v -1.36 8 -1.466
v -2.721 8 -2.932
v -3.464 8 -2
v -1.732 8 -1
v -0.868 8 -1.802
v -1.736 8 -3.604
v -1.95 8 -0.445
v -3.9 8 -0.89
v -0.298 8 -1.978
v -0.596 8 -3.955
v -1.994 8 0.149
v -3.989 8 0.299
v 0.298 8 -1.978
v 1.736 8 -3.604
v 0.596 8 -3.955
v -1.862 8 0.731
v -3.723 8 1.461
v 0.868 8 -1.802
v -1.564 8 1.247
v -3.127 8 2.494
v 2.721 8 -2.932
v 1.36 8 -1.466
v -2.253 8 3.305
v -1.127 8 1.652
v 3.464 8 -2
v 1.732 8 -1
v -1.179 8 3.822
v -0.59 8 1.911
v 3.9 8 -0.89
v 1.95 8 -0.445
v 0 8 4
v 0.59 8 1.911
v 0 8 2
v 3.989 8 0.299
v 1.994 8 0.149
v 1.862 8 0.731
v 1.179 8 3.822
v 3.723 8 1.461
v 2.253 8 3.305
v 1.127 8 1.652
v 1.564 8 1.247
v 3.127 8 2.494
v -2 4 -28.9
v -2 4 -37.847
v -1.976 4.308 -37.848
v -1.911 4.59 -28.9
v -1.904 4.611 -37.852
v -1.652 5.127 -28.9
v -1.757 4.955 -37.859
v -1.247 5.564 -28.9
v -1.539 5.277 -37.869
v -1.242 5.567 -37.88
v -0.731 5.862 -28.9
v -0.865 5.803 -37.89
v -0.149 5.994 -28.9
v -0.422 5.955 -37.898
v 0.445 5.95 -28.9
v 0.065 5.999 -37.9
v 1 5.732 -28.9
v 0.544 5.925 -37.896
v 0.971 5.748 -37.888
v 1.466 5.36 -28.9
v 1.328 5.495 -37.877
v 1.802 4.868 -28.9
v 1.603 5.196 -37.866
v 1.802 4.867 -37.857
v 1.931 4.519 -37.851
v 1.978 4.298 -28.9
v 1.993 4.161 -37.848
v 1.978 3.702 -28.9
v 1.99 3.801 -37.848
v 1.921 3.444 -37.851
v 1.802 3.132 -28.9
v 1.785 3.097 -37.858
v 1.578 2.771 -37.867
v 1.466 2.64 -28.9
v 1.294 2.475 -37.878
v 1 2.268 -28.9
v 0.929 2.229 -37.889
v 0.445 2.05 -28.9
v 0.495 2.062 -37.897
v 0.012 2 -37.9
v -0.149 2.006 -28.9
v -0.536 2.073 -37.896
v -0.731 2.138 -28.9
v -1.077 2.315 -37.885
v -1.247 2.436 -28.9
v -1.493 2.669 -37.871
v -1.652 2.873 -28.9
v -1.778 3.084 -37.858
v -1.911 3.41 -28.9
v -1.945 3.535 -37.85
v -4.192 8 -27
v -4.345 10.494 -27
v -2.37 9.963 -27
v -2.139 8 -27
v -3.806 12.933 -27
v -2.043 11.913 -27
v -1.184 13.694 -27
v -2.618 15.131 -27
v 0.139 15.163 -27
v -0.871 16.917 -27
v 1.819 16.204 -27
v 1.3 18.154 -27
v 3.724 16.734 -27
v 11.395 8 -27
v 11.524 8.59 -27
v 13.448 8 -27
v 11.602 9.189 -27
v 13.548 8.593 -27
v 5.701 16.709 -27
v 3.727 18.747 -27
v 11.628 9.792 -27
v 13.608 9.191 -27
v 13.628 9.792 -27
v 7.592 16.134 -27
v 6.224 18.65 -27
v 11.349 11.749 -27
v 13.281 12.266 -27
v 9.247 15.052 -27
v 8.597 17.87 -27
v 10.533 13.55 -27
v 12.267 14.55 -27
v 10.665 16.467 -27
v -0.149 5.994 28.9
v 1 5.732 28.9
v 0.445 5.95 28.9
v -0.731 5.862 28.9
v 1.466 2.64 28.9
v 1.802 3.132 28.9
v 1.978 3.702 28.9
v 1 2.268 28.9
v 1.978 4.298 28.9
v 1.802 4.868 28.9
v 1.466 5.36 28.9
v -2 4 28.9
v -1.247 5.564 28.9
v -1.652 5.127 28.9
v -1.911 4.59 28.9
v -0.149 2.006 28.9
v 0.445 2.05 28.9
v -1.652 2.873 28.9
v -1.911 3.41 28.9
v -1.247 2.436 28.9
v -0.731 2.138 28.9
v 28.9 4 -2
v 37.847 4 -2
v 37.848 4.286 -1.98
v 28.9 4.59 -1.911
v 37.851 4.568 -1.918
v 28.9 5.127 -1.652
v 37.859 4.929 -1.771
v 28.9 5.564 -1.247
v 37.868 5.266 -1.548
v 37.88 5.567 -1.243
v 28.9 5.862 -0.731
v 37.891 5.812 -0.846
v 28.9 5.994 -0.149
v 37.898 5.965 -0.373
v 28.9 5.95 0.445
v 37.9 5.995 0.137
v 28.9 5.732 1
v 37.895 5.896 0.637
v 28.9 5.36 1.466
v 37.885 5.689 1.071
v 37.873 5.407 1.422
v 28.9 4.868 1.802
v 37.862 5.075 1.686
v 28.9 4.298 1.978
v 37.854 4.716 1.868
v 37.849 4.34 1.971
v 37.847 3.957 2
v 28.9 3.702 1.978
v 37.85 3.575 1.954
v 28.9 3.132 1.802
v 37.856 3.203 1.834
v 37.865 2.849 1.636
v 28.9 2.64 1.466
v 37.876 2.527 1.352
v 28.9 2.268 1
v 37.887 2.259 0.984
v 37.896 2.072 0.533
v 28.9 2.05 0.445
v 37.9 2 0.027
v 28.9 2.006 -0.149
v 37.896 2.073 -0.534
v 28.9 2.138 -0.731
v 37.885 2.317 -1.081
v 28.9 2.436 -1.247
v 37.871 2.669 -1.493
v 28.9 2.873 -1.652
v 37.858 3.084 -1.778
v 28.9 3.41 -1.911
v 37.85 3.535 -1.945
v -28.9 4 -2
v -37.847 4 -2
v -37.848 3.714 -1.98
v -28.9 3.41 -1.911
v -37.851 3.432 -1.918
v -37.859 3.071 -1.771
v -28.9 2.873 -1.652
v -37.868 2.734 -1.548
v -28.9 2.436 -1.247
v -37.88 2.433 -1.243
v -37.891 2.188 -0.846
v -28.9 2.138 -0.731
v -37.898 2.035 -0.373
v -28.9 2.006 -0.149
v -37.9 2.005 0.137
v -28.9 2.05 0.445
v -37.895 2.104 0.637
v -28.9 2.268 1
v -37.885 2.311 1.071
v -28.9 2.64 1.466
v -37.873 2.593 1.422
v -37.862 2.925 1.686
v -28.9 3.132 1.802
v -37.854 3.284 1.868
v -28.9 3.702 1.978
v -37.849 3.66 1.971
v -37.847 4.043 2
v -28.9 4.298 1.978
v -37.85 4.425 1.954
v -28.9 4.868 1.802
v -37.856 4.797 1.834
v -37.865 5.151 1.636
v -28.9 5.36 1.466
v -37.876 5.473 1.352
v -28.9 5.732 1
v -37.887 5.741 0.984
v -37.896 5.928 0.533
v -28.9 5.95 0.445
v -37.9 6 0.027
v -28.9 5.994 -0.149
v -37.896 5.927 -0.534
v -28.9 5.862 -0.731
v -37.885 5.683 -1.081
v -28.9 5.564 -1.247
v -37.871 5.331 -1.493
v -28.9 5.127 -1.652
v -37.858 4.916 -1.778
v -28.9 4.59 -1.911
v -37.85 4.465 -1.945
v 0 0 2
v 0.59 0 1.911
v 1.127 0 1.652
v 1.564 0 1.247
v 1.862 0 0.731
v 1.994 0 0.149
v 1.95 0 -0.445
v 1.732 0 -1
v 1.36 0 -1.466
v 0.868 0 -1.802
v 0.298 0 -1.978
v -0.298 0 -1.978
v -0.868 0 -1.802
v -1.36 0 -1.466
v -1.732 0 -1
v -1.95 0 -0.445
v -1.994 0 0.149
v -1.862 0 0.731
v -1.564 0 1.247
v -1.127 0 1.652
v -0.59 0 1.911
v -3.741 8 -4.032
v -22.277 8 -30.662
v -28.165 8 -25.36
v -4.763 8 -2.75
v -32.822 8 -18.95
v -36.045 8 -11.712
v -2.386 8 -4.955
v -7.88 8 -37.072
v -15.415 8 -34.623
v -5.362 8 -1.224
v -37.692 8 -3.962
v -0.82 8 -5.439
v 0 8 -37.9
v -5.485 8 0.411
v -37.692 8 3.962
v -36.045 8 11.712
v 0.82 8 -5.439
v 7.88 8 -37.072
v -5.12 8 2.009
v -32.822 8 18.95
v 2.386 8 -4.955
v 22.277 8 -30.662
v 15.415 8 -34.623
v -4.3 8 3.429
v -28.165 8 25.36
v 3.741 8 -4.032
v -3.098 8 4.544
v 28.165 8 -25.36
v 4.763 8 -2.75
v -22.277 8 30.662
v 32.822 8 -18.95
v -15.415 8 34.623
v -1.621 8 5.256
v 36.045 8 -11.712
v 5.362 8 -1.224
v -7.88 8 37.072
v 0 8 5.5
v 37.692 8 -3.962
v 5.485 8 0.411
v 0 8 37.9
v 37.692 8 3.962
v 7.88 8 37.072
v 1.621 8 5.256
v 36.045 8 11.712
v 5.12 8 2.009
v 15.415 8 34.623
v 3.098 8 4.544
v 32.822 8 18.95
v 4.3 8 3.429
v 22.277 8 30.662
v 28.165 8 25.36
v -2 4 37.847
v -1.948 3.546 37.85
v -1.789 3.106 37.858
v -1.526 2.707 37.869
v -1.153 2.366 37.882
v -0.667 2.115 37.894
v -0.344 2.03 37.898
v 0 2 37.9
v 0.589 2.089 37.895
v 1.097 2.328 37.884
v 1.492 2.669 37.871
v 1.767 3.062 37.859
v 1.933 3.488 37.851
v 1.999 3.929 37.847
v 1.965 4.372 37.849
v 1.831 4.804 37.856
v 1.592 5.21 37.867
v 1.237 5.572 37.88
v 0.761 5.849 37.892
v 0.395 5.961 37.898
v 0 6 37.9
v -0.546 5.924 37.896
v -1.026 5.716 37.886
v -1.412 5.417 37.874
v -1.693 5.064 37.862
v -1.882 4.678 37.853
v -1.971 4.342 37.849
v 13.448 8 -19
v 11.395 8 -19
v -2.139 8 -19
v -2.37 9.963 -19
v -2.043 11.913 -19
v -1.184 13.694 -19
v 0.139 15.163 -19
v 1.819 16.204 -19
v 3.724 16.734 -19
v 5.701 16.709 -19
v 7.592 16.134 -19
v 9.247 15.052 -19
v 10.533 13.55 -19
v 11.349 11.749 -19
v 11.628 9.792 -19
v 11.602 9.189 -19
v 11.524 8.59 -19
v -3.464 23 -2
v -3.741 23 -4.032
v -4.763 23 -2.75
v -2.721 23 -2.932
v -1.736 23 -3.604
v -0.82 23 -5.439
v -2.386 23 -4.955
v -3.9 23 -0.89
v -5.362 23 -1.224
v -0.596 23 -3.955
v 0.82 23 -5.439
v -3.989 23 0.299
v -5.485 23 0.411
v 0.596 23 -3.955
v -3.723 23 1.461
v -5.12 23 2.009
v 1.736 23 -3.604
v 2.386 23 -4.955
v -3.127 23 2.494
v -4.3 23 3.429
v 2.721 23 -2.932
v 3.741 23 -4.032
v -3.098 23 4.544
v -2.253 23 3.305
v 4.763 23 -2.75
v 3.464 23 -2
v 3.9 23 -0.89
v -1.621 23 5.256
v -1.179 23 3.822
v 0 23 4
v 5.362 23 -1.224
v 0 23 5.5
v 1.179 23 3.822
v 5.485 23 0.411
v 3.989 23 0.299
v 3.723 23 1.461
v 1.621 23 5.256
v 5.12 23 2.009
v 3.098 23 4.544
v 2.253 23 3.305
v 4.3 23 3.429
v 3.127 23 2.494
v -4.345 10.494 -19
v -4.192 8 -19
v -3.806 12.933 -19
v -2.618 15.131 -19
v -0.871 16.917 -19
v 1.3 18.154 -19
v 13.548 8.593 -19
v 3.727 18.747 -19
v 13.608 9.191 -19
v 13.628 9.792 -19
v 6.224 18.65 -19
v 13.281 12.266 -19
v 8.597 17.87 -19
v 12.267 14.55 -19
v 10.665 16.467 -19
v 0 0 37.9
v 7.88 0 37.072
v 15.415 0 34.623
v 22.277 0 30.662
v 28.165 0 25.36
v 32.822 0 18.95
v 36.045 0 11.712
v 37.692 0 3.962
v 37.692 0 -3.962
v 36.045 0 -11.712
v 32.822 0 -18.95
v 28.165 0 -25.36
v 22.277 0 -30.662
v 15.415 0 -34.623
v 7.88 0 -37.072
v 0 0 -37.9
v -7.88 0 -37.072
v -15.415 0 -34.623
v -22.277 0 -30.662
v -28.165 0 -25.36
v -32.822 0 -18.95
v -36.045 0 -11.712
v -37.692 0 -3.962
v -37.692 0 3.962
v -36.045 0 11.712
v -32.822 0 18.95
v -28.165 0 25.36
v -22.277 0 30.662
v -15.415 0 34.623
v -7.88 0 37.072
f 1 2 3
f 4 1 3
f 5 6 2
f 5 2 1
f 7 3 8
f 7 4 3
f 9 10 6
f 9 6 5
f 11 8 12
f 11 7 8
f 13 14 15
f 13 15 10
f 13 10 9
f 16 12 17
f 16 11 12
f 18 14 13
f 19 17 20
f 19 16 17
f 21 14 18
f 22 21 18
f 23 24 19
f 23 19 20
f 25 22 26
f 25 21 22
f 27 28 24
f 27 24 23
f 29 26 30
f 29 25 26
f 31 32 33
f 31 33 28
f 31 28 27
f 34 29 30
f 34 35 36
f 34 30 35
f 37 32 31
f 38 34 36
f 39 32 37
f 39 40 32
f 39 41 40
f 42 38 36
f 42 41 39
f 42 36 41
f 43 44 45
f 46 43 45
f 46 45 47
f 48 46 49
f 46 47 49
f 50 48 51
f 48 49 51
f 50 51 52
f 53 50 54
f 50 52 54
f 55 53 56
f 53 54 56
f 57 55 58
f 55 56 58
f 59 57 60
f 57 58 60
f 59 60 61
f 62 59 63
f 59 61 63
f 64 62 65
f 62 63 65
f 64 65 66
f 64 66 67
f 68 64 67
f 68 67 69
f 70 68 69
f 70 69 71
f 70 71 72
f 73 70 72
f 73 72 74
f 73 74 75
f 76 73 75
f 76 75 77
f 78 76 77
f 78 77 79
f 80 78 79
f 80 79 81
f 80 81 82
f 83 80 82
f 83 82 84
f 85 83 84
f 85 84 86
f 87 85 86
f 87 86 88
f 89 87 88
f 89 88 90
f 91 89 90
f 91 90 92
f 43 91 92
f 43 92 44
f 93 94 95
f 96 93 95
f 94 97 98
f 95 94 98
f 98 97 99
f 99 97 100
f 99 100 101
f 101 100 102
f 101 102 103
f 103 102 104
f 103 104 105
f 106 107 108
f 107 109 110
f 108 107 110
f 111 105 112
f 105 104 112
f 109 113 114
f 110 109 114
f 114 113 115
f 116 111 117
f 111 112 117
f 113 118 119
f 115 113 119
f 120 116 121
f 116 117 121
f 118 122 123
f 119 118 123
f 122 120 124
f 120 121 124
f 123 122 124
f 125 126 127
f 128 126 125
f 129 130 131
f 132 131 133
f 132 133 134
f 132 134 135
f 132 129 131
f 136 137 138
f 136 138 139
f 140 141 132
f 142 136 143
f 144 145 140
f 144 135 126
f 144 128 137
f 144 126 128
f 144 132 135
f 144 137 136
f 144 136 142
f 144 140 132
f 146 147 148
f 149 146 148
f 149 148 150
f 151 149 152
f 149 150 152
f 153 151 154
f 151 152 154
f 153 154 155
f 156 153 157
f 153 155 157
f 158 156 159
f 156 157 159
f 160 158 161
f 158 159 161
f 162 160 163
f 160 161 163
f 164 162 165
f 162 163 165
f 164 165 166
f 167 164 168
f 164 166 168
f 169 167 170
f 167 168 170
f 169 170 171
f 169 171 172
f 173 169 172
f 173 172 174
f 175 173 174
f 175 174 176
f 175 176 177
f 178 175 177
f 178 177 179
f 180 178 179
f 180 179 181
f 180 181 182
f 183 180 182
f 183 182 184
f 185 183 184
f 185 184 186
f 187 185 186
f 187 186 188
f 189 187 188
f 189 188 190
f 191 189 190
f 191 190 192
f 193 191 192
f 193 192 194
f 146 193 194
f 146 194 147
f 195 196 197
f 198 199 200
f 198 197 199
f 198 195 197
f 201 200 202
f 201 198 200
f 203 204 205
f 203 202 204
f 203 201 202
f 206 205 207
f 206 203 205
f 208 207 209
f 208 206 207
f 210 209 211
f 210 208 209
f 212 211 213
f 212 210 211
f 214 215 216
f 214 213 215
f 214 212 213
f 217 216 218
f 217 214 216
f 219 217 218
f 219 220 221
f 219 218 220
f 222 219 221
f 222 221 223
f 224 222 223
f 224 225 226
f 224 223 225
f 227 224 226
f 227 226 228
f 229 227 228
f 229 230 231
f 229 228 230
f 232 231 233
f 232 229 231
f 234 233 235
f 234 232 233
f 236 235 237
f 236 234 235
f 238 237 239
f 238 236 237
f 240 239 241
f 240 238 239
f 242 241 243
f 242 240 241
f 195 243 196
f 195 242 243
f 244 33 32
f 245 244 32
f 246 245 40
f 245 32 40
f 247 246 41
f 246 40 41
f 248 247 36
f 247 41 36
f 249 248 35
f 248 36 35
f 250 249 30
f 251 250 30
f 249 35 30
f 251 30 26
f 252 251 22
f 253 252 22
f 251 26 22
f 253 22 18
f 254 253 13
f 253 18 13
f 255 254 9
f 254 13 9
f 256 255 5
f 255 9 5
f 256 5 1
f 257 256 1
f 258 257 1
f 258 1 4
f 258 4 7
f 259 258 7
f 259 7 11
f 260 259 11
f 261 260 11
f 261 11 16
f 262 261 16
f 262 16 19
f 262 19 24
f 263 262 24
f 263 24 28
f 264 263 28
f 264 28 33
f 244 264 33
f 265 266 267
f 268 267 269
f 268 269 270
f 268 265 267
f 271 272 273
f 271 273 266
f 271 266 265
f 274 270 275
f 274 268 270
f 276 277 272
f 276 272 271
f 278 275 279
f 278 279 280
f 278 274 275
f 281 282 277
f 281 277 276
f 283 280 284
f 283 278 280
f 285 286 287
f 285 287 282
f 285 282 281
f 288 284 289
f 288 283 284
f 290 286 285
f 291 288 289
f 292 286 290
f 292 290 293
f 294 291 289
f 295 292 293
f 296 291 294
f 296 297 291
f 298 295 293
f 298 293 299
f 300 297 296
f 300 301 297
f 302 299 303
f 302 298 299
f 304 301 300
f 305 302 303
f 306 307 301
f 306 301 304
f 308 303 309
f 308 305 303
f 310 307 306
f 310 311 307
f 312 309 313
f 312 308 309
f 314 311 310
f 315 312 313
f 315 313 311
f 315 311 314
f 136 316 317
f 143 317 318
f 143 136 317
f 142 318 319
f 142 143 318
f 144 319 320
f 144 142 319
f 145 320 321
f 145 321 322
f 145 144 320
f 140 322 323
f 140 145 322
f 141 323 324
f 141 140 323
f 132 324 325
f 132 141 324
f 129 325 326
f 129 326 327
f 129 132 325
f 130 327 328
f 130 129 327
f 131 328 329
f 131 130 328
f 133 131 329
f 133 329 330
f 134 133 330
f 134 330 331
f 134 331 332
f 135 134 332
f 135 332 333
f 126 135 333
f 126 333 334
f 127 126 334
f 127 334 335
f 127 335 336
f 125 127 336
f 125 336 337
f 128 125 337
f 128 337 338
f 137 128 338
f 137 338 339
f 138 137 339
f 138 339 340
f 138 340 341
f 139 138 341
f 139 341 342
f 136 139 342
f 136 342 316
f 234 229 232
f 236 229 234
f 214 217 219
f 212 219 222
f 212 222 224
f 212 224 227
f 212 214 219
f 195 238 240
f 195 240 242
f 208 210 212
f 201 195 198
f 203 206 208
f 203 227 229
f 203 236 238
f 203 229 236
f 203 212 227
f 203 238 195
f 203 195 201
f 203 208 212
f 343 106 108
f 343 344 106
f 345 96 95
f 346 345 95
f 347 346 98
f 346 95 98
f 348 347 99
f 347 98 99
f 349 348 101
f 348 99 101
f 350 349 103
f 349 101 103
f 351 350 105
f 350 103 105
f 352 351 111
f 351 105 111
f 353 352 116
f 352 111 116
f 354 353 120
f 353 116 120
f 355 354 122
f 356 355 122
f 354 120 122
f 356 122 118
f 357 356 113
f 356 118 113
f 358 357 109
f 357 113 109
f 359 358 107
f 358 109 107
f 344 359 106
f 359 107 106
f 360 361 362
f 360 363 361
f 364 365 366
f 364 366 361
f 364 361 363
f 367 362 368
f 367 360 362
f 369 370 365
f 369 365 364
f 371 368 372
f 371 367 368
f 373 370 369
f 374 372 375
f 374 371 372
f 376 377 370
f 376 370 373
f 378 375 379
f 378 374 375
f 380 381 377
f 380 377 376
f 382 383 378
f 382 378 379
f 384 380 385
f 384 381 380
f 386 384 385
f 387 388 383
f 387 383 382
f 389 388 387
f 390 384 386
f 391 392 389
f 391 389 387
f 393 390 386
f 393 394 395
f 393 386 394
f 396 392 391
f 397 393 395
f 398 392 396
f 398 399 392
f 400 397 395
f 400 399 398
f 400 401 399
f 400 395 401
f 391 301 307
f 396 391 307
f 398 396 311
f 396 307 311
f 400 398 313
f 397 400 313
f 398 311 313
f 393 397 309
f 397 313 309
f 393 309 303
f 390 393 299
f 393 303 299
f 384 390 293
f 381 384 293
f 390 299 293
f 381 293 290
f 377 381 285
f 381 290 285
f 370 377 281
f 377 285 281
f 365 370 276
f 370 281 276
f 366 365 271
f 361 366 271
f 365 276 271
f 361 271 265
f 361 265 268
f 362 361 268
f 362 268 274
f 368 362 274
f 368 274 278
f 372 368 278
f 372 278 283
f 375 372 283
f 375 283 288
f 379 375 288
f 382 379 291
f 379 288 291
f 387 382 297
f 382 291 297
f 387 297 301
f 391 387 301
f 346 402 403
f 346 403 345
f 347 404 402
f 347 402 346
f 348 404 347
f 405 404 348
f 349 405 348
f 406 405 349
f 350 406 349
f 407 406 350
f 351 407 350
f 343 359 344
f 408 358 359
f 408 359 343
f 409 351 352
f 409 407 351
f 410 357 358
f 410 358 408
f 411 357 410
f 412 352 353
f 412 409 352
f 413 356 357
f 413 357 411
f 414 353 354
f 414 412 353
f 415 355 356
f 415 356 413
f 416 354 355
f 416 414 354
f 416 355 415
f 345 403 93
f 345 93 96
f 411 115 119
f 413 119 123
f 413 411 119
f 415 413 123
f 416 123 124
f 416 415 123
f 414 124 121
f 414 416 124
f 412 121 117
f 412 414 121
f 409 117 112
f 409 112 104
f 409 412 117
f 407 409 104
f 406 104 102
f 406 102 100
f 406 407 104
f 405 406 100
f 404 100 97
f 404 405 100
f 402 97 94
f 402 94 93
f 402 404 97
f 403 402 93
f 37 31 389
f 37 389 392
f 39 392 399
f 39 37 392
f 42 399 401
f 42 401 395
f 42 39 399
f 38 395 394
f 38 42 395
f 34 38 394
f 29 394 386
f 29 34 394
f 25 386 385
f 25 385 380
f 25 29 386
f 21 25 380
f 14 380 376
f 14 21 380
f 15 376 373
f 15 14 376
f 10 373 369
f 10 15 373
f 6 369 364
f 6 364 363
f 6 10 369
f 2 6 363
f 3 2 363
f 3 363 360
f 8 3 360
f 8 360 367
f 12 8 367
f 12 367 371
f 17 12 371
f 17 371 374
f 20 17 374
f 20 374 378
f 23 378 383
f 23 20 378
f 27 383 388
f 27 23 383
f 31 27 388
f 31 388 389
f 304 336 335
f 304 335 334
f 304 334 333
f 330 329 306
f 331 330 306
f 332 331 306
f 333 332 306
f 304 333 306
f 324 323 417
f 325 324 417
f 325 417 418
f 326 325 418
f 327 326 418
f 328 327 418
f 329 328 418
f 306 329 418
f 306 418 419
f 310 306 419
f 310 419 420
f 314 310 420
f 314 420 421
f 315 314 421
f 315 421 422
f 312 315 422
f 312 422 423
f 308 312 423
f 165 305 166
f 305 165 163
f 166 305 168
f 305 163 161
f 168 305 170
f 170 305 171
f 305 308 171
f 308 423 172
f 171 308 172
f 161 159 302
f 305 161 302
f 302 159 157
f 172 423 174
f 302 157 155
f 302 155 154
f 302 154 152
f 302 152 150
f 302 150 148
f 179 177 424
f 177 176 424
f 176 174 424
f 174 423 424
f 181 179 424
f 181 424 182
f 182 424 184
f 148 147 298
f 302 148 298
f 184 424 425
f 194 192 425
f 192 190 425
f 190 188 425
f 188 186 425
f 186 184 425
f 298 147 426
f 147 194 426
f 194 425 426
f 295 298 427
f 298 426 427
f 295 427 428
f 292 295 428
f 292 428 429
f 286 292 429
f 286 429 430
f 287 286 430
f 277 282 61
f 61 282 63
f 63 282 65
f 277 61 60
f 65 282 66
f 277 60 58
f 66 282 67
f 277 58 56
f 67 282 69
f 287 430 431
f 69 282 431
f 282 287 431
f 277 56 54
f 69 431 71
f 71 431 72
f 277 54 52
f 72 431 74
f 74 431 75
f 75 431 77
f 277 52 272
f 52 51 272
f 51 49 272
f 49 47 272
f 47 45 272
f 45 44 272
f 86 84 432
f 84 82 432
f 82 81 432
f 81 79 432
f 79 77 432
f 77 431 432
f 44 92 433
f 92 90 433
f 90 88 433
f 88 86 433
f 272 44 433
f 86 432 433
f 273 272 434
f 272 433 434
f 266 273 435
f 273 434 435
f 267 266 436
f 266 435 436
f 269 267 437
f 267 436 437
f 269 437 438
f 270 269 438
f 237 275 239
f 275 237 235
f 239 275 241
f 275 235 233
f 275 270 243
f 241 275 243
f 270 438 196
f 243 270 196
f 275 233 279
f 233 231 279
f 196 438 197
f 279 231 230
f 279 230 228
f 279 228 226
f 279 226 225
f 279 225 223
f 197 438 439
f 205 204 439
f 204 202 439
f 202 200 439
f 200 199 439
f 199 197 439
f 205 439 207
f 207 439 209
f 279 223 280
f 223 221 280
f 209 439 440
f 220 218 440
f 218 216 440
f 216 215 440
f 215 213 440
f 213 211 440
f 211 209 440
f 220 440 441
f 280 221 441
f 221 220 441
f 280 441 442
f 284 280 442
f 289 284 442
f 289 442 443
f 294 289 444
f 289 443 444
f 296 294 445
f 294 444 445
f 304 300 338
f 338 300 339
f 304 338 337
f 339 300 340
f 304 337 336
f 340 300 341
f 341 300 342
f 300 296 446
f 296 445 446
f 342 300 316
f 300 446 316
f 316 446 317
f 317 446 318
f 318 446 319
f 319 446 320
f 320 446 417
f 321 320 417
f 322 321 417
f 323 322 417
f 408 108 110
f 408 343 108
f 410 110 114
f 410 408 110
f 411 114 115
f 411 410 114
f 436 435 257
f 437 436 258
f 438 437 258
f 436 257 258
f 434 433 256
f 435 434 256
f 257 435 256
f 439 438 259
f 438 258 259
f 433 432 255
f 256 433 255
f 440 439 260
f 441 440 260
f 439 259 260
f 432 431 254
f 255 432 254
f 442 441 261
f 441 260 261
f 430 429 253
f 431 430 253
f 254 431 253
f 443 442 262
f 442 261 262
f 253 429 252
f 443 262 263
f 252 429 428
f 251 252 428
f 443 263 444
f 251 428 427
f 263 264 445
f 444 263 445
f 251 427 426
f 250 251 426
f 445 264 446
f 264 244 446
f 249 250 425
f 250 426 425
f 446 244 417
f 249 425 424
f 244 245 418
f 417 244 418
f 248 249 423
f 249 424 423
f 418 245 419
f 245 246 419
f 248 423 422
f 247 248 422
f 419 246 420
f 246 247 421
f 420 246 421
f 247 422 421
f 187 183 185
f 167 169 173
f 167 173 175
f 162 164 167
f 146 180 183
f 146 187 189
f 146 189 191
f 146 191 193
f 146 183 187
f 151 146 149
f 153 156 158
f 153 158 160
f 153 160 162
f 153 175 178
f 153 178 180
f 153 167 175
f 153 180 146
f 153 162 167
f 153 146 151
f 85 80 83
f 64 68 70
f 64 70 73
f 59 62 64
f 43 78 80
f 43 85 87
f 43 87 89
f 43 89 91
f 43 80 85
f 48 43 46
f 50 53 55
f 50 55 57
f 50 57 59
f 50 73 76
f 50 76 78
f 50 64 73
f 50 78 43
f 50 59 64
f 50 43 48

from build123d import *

# Parameters (mm, degrees)
SKETCH1_R           = 37.9
BOSS_EXTRUDE1_DEPTH = 8
CUT_EXTRUDE2_REACH  = 56.192
SKETCH2_R           = 2
SKETCH4_R           = 5.5
SKETCH4_R_2         = 4
BOSS_EXTRUDE2_DEPTH = 15
BOSS_EXTRUDE5_DEPTH = 4
SKETCH9_R           = 2
CUT_EXTRUDE3_DEPTH  = 9
SKETCH10_R          = 2
CUT_EXTRUDE4_DEPTH  = 9
CUT_EXTRUDE5_START  = -9
SKETCH11_R          = 2
CUT_EXTRUDE5_DEPTH  = 9
CUT_EXTRUDE6_START  = -9
SKETCH12_R          = 2
CUT_EXTRUDE6_DEPTH  = 9


with BuildPart() as part:
    # Sketch1 → Boss-Extrude1 (new body)
    with BuildSketch(Plane(origin=(0, 0, 0), x_dir=(1, 0, 0), z_dir=(0, 1, 0))):
        Circle(SKETCH1_R)
    extrude(amount=BOSS_EXTRUDE1_DEPTH)

    # Sketch2 → Cut-Extrude2 (cut, up to next)
    with BuildSketch(Plane(origin=(0, 8, 0), x_dir=(1, 0, 0), z_dir=(0, 1, 0)), mode=Mode.PRIVATE) as cut_extrude2_sk1:
        Circle(SKETCH2_R)
    cut_extrude2_tool1 = extrude(cut_extrude2_sk1.sketch, amount=-CUT_EXTRUDE2_REACH, mode=Mode.PRIVATE) & part.part
    add(cut_extrude2_tool1.solids().sort_by_distance((0, 8, 0))[0], mode=Mode.SUBTRACT)

    # Sketch4 → Boss-Extrude2 (add)
    with BuildSketch(Plane(origin=(0, 8, 0), x_dir=(1, 0, 0), z_dir=(0, 1, 0))):
        Circle(SKETCH4_R)
        Circle(SKETCH4_R_2, mode=Mode.SUBTRACT)
    extrude(amount=BOSS_EXTRUDE2_DEPTH)

    # Sketch9 → Cut-Extrude3 (cut)
    with BuildSketch(Plane(origin=(0, 0, -37.9), x_dir=(-1, 0, 0), z_dir=(0, 0, -1))):
        with Locations((0, 4)):
            Circle(SKETCH9_R)
    extrude(amount=-CUT_EXTRUDE3_DEPTH, mode=Mode.SUBTRACT)

    # Sketch10 → Cut-Extrude4 (cut)
    with BuildSketch(Plane(origin=(37.9, 0, 0), x_dir=(0, 0, -1), z_dir=(1, 0, 0))):
        with Locations((0, 4)):
            Circle(SKETCH10_R)
    extrude(amount=-CUT_EXTRUDE4_DEPTH, mode=Mode.SUBTRACT)

    # Sketch11 → Cut-Extrude5 (cut)
    with BuildSketch(Plane.XY.offset(37.9).offset(CUT_EXTRUDE5_START)):
        with Locations((0, 4)):
            Circle(SKETCH11_R)
    extrude(amount=CUT_EXTRUDE5_DEPTH, mode=Mode.SUBTRACT)

    # Sketch12 → Cut-Extrude6 (cut)
    with BuildSketch(Plane.ZY.offset(37.9).offset(CUT_EXTRUDE6_START)):
        with Locations((0, 4)):
            Circle(SKETCH12_R)
    extrude(amount=CUT_EXTRUDE6_DEPTH, mode=Mode.SUBTRACT)


with BuildPart() as body_2:
    # Sketch8 → Boss-Extrude5 (new, symmetric)
    with BuildSketch(Plane.XY.offset(-23)):
        with BuildLine():
            ThreePointArc((13.627844773, 9.792220599), (3.727213653, 18.747044081), (-4.191902691, 8))
            Line((-4.191902691, 8), (-2.138834274, 8))
            ThreePointArc((-2.138834274, 8), (3.724172633, 16.733645285), (11.627844773, 9.792220599))
            ThreePointArc((11.627844773, 9.792220599), (11.569269458, 8.88854846), (11.39452382, 8))
            Line((11.39452382, 8), (13.447592237, 8))
            ThreePointArc((13.447592237, 8), (13.582668254, 8.89158948), (13.627844773, 9.792220599))
        make_face()
    extrude(amount=BOSS_EXTRUDE5_DEPTH, both=True)


solid = Compound([part.part, body_2.part])
